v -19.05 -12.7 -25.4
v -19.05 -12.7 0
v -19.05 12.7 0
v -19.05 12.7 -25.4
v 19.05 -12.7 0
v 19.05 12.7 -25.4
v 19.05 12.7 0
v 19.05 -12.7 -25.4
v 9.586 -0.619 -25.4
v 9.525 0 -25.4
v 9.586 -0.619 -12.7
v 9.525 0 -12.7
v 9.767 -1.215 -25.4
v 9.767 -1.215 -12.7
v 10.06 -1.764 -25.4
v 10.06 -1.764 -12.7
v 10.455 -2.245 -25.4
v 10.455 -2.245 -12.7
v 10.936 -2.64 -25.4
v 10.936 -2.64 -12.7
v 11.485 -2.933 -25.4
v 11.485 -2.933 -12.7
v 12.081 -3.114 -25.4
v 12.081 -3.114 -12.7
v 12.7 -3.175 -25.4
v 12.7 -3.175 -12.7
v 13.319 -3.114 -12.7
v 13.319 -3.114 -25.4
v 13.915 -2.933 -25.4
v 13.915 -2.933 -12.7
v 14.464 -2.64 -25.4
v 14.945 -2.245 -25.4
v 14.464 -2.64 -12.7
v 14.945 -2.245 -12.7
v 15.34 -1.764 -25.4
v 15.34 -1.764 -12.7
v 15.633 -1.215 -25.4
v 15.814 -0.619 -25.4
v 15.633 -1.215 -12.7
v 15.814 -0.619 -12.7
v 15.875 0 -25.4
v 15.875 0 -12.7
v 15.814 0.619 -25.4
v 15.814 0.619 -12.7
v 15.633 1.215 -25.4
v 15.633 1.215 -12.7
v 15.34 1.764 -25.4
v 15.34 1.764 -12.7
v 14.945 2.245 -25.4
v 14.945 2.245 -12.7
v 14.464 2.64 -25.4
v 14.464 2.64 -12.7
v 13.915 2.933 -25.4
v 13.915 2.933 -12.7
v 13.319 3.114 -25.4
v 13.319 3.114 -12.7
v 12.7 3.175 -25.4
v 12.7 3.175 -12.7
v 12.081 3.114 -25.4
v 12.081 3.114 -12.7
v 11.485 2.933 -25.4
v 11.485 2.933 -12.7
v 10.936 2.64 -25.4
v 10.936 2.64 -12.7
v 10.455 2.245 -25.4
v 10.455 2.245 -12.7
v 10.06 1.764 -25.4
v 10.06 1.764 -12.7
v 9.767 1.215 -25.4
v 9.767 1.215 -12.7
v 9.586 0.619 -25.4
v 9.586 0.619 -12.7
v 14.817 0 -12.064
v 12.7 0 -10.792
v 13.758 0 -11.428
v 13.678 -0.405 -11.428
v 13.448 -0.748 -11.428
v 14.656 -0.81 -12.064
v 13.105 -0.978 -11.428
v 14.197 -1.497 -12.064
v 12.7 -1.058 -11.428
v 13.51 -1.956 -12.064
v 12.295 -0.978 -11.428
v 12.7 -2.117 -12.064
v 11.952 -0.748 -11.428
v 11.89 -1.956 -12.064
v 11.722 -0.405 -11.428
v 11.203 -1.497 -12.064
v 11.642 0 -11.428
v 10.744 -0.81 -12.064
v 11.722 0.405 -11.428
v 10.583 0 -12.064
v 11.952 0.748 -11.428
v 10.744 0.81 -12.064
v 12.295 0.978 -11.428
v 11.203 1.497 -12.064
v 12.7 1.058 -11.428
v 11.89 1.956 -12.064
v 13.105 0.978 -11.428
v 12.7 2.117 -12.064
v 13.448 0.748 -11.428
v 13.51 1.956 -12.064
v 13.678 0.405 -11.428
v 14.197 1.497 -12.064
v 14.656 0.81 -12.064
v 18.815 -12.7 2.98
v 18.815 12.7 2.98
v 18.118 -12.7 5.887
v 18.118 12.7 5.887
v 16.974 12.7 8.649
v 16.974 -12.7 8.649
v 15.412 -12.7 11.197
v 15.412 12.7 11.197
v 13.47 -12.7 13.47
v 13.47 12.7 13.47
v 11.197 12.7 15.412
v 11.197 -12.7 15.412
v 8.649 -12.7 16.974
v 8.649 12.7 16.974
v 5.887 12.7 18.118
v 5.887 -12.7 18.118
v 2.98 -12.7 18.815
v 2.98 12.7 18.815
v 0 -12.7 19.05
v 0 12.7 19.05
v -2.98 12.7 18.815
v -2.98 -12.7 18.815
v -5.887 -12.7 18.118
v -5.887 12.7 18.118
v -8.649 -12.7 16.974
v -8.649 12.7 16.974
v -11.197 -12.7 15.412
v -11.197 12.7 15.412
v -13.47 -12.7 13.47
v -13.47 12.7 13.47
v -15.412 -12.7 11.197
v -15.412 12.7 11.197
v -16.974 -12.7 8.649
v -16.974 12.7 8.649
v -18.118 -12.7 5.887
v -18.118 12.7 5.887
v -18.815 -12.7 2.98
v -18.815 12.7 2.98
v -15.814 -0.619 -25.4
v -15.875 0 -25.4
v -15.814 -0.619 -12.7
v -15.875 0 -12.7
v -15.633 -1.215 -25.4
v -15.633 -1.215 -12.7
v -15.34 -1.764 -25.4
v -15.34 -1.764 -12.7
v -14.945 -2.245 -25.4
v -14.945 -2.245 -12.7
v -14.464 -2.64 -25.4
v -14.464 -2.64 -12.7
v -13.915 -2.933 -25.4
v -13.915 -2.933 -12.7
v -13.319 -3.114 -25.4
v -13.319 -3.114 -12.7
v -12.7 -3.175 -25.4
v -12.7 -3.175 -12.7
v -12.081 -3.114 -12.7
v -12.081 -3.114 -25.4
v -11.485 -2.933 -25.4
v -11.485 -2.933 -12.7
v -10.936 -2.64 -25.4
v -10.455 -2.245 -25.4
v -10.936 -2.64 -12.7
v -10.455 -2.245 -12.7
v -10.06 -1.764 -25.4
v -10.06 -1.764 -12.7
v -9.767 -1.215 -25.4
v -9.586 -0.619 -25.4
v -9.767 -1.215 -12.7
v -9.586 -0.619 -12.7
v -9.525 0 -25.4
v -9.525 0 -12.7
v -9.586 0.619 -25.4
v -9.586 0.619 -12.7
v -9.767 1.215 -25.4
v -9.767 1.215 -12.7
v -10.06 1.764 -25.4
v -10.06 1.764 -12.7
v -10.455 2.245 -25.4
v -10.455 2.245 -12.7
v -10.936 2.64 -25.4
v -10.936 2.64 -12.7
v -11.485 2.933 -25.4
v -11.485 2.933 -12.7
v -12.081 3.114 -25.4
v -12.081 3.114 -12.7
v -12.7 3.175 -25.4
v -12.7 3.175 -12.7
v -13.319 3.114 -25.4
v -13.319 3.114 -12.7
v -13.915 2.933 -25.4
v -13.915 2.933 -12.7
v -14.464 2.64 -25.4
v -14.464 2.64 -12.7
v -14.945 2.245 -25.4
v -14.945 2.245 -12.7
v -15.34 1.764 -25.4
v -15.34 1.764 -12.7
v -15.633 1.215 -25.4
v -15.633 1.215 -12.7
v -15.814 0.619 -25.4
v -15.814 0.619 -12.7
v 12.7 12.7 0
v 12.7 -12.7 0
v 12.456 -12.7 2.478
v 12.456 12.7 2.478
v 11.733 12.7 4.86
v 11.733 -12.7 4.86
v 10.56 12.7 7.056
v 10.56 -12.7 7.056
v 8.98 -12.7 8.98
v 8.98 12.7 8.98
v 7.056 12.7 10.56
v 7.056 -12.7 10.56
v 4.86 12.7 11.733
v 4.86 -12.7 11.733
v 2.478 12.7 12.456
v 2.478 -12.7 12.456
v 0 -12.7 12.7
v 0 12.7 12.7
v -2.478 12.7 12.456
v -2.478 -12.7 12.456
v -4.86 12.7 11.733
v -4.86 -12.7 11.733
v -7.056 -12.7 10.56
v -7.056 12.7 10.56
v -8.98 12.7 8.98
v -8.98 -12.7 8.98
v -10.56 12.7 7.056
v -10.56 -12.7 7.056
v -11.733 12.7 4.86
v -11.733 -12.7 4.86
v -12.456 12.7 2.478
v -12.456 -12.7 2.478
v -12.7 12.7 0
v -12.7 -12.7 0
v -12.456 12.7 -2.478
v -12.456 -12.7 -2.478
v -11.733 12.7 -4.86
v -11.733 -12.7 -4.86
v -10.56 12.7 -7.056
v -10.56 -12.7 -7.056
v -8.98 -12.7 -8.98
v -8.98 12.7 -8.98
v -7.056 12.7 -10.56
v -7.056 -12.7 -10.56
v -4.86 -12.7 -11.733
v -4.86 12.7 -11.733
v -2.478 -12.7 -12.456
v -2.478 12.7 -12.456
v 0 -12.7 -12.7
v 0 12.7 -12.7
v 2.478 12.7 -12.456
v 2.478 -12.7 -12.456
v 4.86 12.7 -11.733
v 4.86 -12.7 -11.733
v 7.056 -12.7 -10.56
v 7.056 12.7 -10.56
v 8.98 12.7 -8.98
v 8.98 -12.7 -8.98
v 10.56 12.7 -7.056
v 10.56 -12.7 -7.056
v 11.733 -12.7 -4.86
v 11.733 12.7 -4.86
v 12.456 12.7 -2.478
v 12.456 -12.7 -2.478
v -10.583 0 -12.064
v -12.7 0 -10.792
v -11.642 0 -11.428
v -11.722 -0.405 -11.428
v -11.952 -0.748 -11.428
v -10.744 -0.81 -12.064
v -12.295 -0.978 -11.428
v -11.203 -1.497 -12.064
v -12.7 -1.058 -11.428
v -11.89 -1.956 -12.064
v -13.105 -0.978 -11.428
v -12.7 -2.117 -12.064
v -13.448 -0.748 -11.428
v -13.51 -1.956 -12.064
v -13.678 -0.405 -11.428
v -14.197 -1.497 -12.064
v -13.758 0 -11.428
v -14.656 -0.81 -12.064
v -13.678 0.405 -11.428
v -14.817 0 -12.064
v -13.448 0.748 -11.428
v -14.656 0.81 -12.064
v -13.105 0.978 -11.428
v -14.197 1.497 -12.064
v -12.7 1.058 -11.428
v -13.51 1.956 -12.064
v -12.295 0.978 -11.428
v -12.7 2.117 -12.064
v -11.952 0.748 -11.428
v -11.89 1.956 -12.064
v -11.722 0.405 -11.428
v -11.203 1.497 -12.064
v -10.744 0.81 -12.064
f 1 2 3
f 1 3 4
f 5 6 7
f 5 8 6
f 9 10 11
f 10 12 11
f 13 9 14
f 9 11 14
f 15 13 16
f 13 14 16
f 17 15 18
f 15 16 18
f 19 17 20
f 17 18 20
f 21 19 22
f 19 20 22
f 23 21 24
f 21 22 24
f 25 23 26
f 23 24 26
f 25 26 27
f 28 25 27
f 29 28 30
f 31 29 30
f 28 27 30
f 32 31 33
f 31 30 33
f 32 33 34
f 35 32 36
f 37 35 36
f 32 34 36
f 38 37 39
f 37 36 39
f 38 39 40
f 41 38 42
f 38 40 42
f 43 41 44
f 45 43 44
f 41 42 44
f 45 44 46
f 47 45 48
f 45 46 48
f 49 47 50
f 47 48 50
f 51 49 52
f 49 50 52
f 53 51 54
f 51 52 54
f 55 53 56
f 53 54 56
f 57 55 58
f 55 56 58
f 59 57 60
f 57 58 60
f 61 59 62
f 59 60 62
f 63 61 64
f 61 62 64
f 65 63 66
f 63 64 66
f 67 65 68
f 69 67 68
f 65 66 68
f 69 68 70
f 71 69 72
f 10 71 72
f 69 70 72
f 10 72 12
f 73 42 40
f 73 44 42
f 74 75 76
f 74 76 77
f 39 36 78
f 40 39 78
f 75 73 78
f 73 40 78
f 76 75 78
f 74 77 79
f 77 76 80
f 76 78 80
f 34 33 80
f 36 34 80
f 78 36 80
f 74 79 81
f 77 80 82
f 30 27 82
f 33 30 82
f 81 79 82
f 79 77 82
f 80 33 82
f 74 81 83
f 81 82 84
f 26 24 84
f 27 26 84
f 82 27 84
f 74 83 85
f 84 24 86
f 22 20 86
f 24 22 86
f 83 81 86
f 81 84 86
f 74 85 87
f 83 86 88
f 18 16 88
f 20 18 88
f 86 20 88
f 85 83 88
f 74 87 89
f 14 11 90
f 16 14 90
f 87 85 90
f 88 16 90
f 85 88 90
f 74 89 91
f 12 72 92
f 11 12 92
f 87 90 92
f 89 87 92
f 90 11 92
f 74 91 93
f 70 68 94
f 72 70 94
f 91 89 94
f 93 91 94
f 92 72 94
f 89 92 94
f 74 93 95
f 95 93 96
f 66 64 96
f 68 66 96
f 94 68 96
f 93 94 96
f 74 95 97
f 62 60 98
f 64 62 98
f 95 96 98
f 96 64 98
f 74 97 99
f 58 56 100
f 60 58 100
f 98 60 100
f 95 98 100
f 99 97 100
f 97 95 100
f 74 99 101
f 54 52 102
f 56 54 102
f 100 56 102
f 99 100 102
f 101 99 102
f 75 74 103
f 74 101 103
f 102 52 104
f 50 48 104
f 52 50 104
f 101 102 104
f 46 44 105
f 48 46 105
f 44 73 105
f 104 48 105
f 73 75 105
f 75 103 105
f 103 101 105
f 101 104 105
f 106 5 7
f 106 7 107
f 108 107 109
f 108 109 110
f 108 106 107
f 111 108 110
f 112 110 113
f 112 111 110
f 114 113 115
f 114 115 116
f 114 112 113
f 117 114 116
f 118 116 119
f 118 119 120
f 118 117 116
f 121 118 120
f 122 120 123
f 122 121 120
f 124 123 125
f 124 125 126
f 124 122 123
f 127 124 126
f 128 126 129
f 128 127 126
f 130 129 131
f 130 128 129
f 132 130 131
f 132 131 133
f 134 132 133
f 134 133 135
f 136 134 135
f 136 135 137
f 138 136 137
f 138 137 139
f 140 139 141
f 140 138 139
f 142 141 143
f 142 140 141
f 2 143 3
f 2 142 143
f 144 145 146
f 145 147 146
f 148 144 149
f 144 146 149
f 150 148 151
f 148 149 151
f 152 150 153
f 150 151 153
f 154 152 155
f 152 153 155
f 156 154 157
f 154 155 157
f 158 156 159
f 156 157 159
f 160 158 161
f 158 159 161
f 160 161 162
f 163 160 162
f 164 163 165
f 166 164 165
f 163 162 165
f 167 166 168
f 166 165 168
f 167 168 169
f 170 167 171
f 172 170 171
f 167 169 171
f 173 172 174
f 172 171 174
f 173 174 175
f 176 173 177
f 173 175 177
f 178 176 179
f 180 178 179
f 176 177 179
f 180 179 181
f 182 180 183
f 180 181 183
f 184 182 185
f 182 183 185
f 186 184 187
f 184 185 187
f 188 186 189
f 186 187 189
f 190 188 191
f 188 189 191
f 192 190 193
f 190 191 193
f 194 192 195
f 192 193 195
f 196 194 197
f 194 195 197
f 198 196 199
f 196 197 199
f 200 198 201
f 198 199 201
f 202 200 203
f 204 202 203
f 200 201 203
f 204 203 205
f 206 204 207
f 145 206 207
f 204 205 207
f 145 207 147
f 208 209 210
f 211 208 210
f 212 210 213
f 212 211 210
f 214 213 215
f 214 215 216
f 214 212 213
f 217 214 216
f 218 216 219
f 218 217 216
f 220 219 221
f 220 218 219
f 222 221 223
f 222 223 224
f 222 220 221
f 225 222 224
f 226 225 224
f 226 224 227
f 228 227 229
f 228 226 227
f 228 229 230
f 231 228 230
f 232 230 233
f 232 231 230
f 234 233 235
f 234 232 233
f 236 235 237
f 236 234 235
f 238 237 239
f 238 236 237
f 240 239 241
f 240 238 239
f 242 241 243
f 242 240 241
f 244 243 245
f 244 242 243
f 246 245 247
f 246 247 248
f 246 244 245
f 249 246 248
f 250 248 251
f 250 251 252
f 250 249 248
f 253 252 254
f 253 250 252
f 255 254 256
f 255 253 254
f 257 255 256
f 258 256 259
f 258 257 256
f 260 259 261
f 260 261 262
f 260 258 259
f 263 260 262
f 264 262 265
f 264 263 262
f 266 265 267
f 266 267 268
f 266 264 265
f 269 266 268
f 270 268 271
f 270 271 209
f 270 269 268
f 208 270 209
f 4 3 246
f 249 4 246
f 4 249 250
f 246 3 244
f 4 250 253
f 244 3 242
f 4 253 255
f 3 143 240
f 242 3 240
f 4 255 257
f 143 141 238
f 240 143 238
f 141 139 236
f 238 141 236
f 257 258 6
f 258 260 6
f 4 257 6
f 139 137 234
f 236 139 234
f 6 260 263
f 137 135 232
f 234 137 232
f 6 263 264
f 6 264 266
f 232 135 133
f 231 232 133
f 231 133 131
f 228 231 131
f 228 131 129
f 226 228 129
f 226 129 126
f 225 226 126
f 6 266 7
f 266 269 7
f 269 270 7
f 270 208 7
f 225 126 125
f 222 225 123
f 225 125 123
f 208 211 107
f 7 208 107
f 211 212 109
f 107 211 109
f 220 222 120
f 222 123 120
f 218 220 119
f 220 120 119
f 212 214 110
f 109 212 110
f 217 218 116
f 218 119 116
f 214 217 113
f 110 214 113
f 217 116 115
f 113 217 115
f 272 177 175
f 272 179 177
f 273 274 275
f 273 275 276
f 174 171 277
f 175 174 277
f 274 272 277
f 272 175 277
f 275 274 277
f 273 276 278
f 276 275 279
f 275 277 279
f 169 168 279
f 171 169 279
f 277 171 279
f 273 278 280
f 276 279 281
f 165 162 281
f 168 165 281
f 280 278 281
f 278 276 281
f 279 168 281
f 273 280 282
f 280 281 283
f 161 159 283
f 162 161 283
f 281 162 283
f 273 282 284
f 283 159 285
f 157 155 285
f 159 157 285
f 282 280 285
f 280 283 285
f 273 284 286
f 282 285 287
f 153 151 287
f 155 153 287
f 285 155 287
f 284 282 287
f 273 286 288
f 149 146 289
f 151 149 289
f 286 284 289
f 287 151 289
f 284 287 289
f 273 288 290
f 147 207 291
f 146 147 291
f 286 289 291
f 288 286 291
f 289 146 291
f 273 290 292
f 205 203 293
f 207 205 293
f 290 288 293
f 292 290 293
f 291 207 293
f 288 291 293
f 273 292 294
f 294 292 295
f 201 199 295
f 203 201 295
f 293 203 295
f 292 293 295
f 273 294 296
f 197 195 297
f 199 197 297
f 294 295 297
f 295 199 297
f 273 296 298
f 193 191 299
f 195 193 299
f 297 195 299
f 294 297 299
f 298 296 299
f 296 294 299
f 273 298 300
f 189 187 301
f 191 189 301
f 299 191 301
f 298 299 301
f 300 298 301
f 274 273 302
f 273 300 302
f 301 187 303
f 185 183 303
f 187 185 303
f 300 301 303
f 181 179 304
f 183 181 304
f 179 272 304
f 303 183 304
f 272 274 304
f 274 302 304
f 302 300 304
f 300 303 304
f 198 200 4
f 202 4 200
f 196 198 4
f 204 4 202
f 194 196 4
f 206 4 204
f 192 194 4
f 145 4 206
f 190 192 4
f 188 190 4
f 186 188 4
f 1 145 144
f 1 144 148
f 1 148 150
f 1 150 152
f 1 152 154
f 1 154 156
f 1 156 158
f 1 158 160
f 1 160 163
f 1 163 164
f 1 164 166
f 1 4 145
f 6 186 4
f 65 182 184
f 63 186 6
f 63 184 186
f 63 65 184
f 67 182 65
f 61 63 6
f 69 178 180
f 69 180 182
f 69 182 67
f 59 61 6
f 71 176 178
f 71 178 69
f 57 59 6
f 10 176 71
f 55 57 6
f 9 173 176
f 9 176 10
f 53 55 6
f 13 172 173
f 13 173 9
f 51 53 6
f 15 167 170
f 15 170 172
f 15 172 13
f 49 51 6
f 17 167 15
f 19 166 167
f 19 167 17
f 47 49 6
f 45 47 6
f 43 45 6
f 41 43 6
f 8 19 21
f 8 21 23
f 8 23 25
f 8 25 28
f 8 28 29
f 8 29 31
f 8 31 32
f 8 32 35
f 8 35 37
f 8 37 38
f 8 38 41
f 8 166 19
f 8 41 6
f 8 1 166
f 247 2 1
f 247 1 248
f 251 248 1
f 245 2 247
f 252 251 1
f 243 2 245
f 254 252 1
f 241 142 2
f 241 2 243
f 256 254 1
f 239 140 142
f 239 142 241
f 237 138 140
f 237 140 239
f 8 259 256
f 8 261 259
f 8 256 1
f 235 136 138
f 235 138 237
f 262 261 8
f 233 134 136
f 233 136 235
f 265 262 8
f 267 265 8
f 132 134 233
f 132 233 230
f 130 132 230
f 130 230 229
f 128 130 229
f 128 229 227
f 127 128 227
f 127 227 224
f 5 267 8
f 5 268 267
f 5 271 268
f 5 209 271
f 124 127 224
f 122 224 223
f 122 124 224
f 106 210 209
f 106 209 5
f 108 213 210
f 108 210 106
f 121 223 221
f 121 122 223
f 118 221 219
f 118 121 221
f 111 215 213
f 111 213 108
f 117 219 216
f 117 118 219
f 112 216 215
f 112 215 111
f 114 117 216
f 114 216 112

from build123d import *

# Parameters (mm, degrees)
F0_R     = 12.7
F1_DEPTH = 12.7
F3_D     = 6.35
F3_DEPTH = 12.7
F3_TIP   = 1.9077324654


with BuildPart() as f1:
    # F0 (on Front) → F1 (new body, symmetric)
    with BuildSketch(Plane.XZ):
        with BuildLine():
            Line((19.05, -25.4), (19.05, 0))
            ThreePointArc((19.05, 0), (0, 19.05), (-19.05, 0))
            Line((-19.05, 0), (-19.05, -25.4))
            Line((-19.05, -25.4), (19.05, -25.4))
        make_face()
        Circle(F0_R, mode=Mode.SUBTRACT)
    extrude(amount=F1_DEPTH, both=True)

    # F3
    with Locations(Plane(origin=(0, 0, -25.4), x_dir=(1, 0, 0), z_dir=(0, 0, -1))):
        with Locations((-12.7, 0), (12.7, 0)):
            Hole(F3_D / 2, depth=F3_DEPTH)
            with Locations((0, 0, -(F3_DEPTH + F3_TIP / 2))):  # 118° drill point
                Cone(0, F3_D / 2, F3_TIP, mode=Mode.SUBTRACT)


solid = f1.part
